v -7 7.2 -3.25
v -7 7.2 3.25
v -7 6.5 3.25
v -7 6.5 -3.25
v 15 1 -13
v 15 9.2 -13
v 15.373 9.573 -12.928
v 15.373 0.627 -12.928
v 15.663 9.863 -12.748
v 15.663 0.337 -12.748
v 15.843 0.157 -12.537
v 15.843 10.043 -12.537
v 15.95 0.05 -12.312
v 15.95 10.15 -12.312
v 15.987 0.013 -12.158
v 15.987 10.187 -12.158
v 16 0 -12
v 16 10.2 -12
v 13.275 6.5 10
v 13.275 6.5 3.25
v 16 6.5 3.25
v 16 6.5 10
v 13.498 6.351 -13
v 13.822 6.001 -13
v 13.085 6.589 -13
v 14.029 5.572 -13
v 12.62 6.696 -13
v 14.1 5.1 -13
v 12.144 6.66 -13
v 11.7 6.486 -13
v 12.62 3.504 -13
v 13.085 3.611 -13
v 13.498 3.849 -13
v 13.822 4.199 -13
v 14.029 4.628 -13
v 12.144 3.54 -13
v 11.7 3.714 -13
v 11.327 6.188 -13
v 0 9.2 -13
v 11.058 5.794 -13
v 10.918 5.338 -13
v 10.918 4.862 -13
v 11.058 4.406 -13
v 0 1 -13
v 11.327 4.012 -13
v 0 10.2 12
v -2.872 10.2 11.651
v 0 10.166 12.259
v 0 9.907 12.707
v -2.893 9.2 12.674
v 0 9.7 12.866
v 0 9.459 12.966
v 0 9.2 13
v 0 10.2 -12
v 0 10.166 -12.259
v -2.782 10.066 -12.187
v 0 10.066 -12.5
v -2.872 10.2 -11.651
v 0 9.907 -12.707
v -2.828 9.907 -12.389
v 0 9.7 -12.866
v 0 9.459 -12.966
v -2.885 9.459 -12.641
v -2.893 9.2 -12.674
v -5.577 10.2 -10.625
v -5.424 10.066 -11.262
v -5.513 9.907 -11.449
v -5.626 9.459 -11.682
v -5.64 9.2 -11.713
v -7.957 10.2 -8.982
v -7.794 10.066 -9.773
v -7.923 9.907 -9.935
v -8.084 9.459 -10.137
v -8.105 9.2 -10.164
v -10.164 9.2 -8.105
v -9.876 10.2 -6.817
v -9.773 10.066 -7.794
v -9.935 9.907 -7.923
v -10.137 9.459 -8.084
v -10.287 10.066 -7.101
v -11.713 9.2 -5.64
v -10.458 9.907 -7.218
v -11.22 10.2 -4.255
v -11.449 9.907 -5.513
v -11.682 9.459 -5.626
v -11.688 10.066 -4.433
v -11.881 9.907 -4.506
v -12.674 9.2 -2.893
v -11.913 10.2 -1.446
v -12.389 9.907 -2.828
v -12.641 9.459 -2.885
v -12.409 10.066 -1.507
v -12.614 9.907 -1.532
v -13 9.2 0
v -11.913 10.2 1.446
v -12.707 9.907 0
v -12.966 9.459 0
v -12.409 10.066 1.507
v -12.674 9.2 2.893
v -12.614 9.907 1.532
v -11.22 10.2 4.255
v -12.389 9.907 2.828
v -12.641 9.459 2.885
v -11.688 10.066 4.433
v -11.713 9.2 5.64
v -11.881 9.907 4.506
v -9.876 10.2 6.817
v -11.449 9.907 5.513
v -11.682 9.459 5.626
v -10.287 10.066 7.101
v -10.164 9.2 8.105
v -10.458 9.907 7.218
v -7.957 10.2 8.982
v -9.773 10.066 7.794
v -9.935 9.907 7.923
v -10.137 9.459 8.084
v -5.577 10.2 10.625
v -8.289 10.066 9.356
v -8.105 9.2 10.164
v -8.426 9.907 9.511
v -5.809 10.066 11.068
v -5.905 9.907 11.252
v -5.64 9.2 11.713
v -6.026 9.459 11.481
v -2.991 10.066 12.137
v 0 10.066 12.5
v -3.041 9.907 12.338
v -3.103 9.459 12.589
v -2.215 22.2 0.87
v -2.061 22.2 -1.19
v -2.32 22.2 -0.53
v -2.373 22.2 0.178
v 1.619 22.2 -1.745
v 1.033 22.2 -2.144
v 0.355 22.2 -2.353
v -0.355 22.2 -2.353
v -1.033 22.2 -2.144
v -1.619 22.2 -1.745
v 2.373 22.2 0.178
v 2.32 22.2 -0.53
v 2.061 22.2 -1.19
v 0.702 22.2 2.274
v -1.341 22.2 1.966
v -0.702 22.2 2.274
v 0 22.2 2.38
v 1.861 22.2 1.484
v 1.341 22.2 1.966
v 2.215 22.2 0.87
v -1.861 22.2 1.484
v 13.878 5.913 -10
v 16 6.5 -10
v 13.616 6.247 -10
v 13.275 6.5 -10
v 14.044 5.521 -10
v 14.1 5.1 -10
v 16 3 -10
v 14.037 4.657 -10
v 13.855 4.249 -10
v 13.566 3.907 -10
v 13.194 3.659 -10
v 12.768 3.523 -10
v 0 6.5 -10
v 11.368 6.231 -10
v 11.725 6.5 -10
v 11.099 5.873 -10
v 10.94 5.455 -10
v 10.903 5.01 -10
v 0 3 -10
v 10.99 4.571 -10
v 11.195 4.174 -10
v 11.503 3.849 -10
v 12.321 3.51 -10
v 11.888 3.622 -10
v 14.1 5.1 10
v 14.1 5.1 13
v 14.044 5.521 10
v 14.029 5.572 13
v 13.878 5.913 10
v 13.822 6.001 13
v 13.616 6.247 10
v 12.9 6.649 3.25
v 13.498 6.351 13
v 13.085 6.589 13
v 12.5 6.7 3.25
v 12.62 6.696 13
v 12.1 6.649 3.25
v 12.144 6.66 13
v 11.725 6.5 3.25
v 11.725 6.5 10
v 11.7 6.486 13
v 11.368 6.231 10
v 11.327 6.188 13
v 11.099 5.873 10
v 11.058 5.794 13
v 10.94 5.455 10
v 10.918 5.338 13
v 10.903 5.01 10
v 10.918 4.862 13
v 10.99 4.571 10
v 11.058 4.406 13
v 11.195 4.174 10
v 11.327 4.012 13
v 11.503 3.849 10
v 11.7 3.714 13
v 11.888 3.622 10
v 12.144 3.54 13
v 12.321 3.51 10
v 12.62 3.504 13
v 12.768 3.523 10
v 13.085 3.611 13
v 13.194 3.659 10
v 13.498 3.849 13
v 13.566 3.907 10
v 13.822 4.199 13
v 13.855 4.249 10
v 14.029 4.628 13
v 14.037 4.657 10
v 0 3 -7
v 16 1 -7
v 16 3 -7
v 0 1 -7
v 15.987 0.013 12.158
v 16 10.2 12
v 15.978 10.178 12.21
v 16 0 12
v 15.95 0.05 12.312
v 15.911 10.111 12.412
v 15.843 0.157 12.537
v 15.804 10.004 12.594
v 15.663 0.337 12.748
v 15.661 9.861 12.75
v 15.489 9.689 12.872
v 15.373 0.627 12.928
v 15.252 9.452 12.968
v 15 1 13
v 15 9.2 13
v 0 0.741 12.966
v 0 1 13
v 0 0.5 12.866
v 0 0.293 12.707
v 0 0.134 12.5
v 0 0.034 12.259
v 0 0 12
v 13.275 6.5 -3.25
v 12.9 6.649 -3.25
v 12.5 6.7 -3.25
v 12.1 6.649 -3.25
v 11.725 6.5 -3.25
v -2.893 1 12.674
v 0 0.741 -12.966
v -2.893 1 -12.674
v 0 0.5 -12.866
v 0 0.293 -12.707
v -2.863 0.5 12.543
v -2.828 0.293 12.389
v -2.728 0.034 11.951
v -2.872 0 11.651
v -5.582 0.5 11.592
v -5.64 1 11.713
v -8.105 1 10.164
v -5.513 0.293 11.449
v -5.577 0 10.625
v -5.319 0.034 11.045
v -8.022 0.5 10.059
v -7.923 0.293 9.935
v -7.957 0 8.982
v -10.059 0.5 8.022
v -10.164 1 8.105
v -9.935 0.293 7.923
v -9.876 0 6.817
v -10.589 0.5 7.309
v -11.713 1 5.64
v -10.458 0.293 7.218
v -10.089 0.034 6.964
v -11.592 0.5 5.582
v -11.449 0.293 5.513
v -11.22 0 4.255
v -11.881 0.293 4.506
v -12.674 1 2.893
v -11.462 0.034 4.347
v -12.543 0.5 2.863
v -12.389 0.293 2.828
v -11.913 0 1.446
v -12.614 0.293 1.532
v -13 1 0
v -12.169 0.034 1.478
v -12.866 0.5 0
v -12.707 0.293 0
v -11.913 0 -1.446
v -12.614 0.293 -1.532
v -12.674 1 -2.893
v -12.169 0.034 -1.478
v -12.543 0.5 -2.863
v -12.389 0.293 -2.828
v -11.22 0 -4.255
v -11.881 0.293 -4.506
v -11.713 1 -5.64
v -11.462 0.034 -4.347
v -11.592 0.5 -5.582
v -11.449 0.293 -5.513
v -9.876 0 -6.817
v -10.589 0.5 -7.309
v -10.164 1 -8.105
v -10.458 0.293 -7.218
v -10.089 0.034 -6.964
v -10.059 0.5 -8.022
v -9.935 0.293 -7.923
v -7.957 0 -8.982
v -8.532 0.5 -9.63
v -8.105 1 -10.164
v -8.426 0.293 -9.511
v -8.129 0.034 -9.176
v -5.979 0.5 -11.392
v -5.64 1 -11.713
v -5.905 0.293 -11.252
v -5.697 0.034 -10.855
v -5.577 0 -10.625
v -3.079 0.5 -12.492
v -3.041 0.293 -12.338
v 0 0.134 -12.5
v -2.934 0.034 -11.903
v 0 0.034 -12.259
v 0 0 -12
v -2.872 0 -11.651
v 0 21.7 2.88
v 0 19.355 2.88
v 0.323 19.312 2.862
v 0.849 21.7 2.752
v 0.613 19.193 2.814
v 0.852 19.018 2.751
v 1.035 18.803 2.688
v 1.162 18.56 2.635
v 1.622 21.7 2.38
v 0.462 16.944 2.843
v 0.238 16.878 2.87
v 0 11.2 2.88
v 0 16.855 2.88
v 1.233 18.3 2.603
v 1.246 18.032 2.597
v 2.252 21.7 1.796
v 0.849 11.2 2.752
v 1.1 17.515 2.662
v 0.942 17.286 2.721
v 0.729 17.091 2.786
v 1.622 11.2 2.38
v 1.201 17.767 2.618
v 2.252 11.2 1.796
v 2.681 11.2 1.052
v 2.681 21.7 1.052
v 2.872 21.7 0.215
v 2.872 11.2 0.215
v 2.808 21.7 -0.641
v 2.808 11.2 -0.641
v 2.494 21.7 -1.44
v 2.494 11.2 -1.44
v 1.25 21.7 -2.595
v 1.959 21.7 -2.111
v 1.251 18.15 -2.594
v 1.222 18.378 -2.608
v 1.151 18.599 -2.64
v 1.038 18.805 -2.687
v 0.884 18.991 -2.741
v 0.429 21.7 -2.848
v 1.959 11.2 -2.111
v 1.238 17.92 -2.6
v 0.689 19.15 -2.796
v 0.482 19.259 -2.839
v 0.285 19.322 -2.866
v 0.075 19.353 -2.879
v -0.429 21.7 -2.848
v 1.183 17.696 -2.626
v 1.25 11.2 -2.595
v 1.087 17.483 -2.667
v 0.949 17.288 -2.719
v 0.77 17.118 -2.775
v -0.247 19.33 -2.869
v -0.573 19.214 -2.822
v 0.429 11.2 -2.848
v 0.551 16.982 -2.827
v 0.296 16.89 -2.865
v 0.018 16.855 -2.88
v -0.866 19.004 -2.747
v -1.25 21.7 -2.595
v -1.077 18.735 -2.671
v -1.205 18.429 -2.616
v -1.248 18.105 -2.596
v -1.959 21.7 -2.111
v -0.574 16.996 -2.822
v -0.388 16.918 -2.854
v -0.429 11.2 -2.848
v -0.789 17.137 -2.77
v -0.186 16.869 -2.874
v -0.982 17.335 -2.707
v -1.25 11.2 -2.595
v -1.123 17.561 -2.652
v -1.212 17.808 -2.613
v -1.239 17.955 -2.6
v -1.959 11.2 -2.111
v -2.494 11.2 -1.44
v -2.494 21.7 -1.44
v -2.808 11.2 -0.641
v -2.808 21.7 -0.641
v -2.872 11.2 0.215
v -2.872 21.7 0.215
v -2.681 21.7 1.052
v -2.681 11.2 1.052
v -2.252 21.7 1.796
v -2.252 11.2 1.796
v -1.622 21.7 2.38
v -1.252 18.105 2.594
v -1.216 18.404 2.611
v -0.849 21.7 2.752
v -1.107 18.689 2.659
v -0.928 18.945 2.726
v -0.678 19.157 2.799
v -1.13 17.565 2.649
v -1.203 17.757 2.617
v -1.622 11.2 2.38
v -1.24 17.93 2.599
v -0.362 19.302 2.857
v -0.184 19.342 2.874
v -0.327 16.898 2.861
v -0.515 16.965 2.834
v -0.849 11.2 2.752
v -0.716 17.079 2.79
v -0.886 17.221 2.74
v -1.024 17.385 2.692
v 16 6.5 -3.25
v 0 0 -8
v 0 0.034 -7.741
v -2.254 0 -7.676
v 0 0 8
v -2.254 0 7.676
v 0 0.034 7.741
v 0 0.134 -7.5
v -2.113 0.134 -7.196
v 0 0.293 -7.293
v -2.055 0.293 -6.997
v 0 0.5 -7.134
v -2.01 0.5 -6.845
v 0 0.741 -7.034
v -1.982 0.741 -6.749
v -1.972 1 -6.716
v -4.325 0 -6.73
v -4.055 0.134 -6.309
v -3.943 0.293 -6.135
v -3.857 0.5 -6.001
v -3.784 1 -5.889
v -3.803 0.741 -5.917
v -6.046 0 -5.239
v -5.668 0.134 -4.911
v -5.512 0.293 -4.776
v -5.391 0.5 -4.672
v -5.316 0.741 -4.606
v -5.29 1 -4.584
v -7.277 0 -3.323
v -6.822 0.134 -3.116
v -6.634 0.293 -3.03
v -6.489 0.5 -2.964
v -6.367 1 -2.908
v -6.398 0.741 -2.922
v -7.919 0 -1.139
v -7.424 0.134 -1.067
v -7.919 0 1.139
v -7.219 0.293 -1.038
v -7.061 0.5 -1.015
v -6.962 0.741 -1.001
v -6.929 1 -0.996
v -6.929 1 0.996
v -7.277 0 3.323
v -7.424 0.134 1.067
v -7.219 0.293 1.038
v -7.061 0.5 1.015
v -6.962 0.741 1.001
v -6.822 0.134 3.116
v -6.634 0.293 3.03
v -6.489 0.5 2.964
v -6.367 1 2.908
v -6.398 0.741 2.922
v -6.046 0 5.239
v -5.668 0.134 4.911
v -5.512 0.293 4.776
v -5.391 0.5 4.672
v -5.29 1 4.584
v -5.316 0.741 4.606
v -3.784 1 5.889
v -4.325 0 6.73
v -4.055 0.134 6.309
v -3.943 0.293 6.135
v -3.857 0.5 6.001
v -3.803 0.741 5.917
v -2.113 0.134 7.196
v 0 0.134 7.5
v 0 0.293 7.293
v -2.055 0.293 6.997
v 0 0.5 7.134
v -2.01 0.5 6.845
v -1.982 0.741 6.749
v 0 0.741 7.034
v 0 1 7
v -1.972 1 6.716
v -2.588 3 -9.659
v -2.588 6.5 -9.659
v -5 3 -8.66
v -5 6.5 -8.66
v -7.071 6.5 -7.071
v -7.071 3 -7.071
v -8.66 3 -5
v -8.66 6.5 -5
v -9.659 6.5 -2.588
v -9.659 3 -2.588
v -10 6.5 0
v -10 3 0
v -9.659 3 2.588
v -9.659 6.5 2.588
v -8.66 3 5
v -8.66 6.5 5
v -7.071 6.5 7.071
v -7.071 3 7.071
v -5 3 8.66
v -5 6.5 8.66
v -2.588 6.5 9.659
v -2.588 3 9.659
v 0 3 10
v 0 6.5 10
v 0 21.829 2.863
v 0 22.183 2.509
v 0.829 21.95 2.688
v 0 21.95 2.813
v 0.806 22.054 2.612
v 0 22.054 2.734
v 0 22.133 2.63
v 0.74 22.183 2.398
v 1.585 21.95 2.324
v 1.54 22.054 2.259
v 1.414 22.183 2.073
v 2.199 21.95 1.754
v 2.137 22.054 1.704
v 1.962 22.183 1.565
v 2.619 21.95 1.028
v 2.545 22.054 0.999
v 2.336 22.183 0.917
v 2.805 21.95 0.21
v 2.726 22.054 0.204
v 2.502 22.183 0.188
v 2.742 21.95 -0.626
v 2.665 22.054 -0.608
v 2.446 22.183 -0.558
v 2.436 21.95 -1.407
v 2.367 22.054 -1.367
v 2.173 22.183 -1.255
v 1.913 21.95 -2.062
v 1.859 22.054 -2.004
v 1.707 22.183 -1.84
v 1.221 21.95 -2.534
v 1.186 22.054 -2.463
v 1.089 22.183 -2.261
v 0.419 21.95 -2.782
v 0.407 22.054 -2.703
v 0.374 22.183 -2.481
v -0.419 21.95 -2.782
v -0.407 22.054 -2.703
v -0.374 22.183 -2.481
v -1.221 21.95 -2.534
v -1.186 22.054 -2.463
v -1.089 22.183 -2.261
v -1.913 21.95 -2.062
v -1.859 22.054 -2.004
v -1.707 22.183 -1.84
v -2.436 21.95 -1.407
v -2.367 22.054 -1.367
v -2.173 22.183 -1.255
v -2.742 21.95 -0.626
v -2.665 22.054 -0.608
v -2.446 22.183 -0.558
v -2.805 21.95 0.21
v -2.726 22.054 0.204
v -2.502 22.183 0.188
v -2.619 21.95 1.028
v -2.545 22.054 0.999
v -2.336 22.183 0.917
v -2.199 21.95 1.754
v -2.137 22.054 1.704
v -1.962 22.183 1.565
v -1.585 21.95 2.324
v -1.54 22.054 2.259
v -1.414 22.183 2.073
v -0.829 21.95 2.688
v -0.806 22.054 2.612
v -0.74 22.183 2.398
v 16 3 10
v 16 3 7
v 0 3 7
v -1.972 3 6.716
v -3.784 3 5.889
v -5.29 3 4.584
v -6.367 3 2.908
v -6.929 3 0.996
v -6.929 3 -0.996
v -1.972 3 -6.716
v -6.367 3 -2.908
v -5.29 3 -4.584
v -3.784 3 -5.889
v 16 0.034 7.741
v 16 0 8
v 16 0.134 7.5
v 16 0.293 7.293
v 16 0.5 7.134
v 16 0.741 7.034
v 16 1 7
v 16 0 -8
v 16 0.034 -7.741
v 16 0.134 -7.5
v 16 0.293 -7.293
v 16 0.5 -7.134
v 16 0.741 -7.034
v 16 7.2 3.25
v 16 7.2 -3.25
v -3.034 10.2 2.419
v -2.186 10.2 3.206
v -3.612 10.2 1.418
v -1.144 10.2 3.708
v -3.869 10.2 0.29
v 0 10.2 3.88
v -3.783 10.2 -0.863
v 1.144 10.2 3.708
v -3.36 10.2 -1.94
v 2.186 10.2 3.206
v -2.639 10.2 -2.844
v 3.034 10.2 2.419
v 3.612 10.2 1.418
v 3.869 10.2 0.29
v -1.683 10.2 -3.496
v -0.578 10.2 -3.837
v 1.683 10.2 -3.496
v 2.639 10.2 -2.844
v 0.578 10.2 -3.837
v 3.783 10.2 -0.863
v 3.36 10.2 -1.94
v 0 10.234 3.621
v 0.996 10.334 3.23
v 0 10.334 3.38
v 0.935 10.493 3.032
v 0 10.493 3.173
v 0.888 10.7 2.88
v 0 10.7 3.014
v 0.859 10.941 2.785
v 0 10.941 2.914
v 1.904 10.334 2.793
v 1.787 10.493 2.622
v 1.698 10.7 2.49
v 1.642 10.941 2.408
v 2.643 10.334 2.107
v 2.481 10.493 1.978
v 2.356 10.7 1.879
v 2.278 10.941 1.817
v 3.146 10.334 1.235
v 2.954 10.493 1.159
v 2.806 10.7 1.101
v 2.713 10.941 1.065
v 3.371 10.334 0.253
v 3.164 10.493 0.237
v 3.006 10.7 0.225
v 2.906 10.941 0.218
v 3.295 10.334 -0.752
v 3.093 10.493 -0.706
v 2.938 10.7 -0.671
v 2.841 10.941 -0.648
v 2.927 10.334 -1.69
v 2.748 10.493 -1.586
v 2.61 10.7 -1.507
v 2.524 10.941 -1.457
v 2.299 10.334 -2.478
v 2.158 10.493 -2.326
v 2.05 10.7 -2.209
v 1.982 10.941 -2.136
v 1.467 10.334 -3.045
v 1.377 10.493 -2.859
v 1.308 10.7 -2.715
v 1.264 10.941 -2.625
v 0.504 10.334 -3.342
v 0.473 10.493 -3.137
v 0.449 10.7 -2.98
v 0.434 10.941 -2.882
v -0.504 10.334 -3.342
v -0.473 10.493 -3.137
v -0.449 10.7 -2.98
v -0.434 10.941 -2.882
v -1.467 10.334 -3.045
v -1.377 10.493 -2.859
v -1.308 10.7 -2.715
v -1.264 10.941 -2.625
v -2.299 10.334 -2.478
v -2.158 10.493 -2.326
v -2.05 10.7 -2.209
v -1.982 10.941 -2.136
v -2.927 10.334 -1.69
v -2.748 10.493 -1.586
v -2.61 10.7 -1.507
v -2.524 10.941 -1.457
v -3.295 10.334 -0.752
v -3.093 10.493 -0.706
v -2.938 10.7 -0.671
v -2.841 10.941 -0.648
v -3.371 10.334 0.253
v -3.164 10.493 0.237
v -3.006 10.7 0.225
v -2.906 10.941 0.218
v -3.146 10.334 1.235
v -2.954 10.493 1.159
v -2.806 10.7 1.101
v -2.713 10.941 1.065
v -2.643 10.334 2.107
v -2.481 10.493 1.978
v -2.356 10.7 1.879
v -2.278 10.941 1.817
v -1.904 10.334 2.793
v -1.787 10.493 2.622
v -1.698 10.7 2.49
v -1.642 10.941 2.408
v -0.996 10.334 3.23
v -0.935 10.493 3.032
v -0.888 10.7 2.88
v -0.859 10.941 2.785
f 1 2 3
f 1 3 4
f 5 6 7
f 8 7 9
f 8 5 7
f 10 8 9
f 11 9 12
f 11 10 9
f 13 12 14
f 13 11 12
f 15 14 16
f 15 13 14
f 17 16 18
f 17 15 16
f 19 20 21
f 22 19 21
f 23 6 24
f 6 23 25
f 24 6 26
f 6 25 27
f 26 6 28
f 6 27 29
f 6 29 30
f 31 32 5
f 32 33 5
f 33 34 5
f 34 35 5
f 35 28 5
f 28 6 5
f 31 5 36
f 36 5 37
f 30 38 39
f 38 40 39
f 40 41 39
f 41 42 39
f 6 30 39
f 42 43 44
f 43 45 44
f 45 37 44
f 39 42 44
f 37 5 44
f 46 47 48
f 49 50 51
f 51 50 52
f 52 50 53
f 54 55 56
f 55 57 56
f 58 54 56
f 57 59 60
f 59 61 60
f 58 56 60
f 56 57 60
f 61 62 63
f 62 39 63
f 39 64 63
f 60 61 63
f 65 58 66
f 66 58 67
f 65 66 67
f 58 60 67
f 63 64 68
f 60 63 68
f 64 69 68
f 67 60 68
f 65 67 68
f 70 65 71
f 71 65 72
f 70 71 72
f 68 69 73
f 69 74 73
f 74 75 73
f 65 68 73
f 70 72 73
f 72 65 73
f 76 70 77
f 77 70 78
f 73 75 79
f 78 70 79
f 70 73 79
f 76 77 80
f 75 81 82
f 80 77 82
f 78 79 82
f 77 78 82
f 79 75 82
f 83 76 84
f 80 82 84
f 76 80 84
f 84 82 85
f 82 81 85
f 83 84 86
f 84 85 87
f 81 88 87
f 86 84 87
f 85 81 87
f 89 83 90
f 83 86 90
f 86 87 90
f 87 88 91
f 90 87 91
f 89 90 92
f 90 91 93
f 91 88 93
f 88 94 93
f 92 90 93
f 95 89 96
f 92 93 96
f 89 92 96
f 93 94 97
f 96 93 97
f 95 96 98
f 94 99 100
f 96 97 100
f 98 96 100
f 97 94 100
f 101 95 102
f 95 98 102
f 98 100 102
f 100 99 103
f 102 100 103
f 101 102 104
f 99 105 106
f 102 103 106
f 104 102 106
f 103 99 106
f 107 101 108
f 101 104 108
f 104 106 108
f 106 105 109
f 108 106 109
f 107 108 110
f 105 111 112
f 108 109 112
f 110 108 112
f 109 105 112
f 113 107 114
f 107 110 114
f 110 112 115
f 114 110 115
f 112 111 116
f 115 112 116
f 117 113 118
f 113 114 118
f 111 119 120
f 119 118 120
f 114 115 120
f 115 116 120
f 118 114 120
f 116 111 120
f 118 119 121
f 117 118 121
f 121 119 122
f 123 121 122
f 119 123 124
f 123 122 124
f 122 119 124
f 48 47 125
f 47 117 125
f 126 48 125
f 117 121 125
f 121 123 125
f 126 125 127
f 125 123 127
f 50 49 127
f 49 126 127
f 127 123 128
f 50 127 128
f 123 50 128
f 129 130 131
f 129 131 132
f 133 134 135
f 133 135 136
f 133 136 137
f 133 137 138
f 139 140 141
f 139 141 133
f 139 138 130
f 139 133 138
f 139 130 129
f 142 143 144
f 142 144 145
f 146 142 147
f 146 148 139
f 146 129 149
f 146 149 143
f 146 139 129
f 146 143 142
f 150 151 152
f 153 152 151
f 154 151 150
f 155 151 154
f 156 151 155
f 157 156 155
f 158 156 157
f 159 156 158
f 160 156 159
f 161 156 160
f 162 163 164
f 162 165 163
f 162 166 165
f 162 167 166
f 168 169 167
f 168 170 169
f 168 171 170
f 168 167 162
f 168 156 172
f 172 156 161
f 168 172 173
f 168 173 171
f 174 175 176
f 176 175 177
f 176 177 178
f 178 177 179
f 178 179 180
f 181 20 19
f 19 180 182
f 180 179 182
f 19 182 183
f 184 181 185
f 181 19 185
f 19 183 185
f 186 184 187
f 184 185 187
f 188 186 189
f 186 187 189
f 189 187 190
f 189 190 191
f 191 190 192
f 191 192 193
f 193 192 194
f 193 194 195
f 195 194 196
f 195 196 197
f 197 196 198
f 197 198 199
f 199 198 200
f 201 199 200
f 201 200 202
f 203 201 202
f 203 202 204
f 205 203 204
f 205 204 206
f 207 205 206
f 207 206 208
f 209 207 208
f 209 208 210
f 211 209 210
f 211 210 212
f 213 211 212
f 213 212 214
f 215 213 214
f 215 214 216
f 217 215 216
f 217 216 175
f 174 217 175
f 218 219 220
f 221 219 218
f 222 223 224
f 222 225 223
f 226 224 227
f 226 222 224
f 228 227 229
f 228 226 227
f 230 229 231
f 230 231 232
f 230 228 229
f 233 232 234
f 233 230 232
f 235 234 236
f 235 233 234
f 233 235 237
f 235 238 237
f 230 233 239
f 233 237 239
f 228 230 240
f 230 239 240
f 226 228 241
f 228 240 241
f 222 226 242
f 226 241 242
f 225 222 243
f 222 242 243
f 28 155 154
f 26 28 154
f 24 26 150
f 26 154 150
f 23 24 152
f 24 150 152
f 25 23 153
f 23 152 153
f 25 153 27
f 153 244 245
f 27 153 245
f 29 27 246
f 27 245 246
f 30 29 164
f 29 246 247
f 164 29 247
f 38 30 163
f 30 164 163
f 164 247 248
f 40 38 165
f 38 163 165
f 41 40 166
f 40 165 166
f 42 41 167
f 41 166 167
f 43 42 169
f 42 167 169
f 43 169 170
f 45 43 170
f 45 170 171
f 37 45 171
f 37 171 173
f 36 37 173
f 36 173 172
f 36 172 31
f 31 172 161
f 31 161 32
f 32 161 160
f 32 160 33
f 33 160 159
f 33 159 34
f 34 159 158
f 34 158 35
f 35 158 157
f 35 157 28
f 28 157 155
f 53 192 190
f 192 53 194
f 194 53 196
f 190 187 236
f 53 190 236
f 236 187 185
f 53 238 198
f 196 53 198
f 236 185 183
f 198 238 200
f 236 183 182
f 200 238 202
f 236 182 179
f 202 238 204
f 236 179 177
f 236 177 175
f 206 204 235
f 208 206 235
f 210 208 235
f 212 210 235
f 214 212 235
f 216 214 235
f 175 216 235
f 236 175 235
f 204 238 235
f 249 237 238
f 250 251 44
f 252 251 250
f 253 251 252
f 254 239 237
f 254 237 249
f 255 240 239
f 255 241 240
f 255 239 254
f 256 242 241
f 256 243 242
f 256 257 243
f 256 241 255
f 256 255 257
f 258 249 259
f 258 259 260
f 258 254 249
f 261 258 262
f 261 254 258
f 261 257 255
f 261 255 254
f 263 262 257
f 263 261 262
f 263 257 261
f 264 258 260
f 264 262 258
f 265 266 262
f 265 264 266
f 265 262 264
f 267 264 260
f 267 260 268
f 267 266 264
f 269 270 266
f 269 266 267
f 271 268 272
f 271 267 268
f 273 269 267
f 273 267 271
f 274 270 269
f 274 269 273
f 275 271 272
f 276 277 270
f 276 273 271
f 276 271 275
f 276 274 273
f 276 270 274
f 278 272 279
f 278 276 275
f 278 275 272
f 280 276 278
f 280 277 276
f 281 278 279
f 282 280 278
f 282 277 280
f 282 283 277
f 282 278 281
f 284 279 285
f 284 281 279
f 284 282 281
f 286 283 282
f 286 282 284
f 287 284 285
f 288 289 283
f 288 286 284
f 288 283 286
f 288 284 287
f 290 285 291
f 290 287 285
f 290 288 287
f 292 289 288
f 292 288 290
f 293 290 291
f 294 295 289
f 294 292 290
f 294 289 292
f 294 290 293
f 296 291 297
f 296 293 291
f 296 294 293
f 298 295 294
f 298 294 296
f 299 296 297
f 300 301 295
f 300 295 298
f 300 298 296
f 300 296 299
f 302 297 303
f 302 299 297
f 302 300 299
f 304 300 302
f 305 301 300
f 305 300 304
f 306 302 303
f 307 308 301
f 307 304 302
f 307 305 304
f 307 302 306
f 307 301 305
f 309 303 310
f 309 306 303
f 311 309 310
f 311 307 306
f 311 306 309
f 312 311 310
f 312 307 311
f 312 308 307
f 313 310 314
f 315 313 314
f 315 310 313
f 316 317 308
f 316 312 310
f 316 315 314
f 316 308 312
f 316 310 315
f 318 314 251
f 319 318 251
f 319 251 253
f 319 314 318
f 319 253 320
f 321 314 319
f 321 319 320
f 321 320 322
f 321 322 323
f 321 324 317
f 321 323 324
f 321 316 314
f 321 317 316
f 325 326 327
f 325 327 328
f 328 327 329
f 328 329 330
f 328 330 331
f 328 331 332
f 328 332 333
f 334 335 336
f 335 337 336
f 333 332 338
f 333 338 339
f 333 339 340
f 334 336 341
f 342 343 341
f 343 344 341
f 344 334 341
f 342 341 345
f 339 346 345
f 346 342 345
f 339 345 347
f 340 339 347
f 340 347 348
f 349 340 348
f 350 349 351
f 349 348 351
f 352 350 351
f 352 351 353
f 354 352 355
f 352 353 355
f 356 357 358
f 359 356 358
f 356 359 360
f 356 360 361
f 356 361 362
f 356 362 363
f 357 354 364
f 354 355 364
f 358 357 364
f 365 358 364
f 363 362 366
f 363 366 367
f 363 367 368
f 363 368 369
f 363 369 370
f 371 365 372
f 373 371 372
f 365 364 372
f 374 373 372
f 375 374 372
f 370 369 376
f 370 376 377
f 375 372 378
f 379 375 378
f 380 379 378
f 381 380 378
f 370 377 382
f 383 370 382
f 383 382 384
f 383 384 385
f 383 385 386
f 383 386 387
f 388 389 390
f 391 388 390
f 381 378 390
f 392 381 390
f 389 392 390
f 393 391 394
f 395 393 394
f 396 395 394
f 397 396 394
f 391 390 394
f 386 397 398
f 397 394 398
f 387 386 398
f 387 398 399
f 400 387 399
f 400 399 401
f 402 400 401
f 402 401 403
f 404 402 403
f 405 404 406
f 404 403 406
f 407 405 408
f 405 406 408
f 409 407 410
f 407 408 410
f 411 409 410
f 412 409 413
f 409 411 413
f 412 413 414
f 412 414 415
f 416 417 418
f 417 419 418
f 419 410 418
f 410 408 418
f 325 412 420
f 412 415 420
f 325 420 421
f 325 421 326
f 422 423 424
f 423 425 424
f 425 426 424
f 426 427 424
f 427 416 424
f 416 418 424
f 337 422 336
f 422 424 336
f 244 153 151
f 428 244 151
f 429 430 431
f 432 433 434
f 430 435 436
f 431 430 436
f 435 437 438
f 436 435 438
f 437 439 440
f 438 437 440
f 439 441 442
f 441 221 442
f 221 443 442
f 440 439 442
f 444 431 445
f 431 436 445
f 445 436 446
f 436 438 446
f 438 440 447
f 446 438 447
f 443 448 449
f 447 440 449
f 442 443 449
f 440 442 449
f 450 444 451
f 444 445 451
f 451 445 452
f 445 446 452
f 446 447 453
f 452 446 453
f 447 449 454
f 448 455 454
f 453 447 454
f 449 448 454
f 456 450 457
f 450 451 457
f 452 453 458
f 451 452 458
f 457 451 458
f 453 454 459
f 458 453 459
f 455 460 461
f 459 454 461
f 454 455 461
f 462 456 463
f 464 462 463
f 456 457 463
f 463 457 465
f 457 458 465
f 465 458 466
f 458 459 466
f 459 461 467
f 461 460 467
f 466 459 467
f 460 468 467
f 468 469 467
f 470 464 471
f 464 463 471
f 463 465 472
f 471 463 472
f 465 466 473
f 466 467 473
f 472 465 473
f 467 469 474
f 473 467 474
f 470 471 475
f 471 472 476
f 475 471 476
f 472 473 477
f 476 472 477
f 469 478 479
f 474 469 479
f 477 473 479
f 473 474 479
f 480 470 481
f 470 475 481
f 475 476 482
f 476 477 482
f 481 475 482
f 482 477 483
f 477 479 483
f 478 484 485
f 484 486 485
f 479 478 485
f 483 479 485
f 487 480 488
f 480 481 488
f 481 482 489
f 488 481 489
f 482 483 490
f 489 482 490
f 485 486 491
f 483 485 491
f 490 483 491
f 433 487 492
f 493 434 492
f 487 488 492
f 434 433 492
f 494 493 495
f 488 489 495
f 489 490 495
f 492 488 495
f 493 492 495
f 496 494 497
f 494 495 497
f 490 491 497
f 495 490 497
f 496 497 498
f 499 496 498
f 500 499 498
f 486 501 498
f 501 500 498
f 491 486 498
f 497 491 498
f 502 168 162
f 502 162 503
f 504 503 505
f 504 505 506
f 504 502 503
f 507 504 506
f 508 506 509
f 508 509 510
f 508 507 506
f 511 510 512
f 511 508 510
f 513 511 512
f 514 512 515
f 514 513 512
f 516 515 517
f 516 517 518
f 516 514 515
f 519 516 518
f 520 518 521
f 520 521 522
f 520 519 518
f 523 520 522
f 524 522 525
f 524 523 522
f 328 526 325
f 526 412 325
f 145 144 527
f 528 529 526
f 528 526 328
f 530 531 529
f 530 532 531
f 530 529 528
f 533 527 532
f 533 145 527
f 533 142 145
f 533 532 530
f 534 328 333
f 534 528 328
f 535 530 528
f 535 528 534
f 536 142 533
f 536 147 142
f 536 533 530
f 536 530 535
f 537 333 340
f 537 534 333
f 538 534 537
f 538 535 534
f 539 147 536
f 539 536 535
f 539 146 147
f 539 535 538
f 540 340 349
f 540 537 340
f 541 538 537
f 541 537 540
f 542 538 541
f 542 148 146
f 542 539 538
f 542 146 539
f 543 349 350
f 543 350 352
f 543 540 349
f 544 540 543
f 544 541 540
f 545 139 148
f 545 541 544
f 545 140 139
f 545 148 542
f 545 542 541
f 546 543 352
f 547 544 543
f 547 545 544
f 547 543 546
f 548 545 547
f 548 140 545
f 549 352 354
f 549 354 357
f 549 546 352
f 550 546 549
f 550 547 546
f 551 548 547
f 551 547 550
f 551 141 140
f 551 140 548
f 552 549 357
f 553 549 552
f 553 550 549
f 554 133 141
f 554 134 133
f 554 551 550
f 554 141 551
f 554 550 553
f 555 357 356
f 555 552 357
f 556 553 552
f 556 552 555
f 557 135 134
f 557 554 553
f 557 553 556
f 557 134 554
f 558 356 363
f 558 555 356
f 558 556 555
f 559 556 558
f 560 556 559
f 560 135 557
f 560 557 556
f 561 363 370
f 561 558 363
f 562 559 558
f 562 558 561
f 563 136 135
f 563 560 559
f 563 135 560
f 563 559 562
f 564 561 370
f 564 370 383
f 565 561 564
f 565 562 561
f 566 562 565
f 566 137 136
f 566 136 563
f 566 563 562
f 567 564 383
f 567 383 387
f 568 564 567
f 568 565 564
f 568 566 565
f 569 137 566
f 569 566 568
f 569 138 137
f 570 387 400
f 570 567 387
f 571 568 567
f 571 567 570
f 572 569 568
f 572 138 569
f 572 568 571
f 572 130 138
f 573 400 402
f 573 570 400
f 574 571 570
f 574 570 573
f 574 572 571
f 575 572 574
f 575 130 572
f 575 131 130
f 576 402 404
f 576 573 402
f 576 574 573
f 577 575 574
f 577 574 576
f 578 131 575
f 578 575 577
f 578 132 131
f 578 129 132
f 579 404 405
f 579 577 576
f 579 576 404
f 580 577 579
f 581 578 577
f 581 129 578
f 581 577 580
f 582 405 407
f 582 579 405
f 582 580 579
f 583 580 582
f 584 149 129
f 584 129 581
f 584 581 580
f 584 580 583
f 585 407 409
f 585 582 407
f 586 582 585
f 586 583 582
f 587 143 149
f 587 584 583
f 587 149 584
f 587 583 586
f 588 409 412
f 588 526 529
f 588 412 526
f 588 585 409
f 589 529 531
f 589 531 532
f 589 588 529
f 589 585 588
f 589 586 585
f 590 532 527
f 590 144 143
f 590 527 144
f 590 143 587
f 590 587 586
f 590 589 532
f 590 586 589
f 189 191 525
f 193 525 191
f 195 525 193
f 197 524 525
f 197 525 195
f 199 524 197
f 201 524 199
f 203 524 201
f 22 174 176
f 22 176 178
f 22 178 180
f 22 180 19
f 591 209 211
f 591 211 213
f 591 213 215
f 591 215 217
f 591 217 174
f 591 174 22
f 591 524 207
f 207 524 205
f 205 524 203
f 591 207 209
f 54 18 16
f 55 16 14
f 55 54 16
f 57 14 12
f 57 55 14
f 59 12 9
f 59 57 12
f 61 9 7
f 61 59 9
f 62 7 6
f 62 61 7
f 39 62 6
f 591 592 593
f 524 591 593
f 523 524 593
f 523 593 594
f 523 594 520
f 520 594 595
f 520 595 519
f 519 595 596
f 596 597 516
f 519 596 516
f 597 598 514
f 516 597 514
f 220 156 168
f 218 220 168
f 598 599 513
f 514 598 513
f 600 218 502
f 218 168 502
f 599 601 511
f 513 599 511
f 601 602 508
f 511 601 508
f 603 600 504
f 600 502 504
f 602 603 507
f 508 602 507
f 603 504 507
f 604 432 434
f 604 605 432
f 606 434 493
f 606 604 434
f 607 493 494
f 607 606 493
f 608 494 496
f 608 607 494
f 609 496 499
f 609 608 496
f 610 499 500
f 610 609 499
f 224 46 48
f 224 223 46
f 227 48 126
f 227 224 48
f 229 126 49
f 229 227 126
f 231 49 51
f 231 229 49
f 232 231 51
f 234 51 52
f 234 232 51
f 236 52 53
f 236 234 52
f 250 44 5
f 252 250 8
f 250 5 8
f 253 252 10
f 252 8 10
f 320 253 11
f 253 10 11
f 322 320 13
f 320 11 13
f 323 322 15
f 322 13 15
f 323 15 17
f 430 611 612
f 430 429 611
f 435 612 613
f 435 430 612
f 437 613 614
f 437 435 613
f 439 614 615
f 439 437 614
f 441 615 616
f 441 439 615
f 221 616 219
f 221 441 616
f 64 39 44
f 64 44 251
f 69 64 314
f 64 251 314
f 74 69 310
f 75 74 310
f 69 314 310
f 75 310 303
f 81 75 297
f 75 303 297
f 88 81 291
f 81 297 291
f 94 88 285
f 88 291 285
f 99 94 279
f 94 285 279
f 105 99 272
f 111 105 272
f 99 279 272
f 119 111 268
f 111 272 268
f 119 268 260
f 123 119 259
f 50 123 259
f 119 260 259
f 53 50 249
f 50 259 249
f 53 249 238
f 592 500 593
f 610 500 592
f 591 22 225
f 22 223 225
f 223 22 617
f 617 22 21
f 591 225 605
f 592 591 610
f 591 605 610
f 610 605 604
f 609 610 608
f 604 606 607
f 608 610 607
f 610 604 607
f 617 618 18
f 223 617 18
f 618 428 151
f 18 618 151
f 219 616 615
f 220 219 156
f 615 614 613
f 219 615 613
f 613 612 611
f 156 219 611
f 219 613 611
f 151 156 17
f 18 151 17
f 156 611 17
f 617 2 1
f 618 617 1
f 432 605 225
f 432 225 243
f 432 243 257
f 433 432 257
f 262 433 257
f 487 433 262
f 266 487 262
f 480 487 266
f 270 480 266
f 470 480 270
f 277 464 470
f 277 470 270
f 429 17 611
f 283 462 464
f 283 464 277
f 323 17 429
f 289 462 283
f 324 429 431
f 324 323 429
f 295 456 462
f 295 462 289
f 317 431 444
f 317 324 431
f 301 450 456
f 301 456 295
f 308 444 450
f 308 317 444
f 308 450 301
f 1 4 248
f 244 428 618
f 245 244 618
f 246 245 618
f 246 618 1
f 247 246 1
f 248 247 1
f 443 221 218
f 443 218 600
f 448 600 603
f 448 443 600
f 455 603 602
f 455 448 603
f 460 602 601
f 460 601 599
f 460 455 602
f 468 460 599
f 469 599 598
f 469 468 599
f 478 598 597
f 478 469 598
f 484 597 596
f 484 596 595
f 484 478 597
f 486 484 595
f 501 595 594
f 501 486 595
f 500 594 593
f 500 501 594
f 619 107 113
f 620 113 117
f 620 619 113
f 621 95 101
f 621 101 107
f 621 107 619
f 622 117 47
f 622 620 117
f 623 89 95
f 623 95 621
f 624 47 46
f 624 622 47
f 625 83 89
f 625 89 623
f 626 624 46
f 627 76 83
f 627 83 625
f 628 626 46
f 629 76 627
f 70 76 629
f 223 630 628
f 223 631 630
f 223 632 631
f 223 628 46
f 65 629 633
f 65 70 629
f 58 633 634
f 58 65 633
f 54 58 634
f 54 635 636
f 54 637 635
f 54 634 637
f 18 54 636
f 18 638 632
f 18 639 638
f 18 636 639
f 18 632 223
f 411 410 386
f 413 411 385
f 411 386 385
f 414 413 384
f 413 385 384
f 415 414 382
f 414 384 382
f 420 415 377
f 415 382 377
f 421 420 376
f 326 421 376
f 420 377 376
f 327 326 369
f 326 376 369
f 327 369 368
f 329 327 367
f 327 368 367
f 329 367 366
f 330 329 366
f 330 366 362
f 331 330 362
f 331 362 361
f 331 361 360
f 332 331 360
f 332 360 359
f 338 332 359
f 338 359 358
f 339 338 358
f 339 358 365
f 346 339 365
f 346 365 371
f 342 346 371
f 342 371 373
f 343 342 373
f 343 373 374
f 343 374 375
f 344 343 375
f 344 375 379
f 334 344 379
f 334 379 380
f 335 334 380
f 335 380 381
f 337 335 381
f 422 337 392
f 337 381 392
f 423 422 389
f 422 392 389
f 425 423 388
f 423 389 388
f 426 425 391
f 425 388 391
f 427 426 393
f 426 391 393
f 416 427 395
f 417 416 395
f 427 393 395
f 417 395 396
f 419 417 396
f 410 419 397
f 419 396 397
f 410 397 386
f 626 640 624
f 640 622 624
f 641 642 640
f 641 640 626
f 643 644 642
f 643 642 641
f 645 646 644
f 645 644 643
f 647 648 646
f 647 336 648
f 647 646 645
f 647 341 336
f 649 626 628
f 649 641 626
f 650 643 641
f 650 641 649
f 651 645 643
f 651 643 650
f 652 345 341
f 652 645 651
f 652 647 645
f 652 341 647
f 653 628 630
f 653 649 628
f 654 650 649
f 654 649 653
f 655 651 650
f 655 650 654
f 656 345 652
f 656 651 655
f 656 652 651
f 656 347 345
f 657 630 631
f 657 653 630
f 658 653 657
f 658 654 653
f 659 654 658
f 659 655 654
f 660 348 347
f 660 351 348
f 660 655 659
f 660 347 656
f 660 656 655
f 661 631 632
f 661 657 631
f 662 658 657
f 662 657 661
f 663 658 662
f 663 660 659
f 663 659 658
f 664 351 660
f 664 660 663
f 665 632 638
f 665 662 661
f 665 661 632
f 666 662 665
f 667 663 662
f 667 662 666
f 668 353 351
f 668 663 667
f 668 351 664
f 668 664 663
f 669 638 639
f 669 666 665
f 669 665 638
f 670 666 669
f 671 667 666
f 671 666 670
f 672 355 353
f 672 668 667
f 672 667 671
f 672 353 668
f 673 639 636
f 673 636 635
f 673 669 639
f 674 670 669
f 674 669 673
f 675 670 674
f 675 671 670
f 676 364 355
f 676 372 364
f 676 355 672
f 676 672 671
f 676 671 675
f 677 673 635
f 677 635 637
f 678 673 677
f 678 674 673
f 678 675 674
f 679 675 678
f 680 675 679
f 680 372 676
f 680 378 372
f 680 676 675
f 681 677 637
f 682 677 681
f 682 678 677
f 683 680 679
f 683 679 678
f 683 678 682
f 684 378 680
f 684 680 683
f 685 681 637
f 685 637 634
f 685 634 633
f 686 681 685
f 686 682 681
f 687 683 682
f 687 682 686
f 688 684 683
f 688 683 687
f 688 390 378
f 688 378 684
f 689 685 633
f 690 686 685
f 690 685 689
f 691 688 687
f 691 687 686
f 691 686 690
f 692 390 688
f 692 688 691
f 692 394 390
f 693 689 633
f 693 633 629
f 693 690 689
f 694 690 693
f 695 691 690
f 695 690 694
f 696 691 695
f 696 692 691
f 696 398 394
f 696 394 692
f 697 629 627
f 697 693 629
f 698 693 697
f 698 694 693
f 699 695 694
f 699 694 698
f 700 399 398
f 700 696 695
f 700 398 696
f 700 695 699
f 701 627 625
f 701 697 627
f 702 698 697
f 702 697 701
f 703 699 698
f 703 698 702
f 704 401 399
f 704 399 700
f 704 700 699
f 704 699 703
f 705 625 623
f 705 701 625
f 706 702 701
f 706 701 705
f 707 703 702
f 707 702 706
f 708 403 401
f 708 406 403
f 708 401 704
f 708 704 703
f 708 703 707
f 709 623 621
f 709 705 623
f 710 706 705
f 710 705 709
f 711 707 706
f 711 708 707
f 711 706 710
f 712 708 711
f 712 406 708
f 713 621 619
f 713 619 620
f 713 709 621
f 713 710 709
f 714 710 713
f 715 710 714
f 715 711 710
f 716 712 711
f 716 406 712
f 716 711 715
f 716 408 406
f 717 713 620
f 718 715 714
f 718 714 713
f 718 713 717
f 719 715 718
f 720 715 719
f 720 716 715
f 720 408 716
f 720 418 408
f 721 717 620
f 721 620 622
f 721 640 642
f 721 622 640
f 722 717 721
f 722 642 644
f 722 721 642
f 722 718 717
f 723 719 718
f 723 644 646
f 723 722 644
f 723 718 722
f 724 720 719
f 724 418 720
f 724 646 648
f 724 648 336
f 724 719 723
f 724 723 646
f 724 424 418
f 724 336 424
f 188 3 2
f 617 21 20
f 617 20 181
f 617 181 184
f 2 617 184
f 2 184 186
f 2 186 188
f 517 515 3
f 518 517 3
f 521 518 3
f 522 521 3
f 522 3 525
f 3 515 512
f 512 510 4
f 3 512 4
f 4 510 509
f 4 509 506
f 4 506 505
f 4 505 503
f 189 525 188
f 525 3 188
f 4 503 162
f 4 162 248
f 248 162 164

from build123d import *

# Parameters (mm, degrees)
BOSS_EXTRUDE1_DEPTH   = 3
BOSS_EXTRUDE2_DEPTH   = 3.5
BOSS_EXTRUDE3_DEPTH   = 3.7
SKETCH4_R             = 2.88
BOSS_EXTRUDE4_DEPTH   = 12
SKETCH9_W             = 6.5
SKETCH9_H             = 0.7
CUT_EXTRUDE2_DEPTH    = 23
F_2_5MM_DOWEL_HOLE1_D = 2.5
SKETCH8_R             = 1.6
CUT_EXTRUDE1_DEPTH    = 38.747052924
FILLET1_R             = 1
FILLET2_R             = 1
FILLET3_R             = 0.5


with BuildPart() as part:
    # Sketch1 → Boss-Extrude1 (new body)
    with BuildSketch(Plane(origin=(0, 0, 0), x_dir=(1, 0, 0), z_dir=(0, 1, 0))):
        with BuildLine():
            Line((0, 13), (16, 13))
            Line((16, 13), (16, 7))
            Line((16, 7), (0, 7))
            ThreePointArc((0, 7), (-7, 0), (0, -7))
            Line((0, -7), (16, -7))
            Line((16, -7), (16, -13))
            Line((16, -13), (0, -13))
            ThreePointArc((0, -13), (-13, 0), (0, 13))
        make_face()
    extrude(amount=BOSS_EXTRUDE1_DEPTH)

    # Sketch2 → Boss-Extrude2 (add)
    with BuildSketch(Plane(origin=(0, 3, 0), x_dir=(1, 0, 0), z_dir=(0, 1, 0))):
        with BuildLine():
            Line((0, 13), (16, 13))
            Line((16, 13), (16, 10))
            Line((16, 10), (0, 10))
            ThreePointArc((0, 10), (-10, 0), (0, -10))
            Line((0, -10), (16, -10))
            Line((16, -10), (16, -13))
            Line((16, -13), (0, -13))
            ThreePointArc((0, -13), (-13, 0), (0, 13))
        make_face()
    extrude(amount=BOSS_EXTRUDE2_DEPTH)

    # Sketch3 → Boss-Extrude3 (add)
    with BuildSketch(Plane(origin=(0, 6.5, 0), x_dir=(1, 0, 0), z_dir=(0, 1, 0))):
        with BuildLine():
            Line((16, 13), (0, 13))
            ThreePointArc((0, 13), (-13, 0), (0, -13))
            Line((0, -13), (16, -13))
            Line((16, -13), (16, -7))
            Line((16, -7), (16, 7))
            Line((16, 7), (16, 13))
        make_face()
    extrude(amount=BOSS_EXTRUDE3_DEPTH)

    # Sketch4 → Boss-Extrude4 (add)
    with BuildSketch(Plane(origin=(0, 10.2, 0), x_dir=(1, 0, 0), z_dir=(0, 1, 0))):
        with Locations(Location((0, 0, 0), (0, 0, 270))):
            Circle(SKETCH4_R)
    extrude(amount=BOSS_EXTRUDE4_DEPTH)

    # Sketch9 → Cut-Extrude2 (cut)
    with BuildSketch(Plane(origin=(16, 0, 0), x_dir=(0, 0, -1), z_dir=(1, 0, 0))):
        with Locations((0, 6.85)):
            Rectangle(SKETCH9_W, SKETCH9_H)
    extrude(amount=-CUT_EXTRUDE2_DEPTH, mode=Mode.SUBTRACT)

    # Ø2.5mm Dowel Hole1 (through all)
    with Locations(Plane(origin=(-0.002429038, 18.104937254, 2.879998976), x_dir=(0.999999644325, 0, 0.000843415861), z_dir=(-0.000843415861, 0, 0.999999644325))):
        with Locations((0, 0)):
            Hole(F_2_5MM_DOWEL_HOLE1_D / 2)

    # Sketch8 → Cut-Extrude1 (cut, through all)
    with BuildSketch(Plane.XY.offset(13)):
        with Locations((12.5, 5.1)):
            Circle(SKETCH8_R)
    extrude(amount=-CUT_EXTRUDE1_DEPTH, mode=Mode.SUBTRACT)

    # Fillet1
    fillet1_edges = [part.edges().sort_by_distance(p)[0] for p in [
        (8, 0, -13),
        (8, 0, -7),
        (-7, 0, 0),
        (16, 5.1, 13),
        (16, 5.1, -13),
        (-13, 10.2, 0),
        (8, 10.2, 13),
        (8, 10.2, -13),
        (8, 0, 7),
        (8, 0, 13),
        (-13, 0, 0),
    ]]
    fillet(fillet1_edges, radius=FILLET1_R)

    # Fillet2
    fillet2_edges = [part.edges().sort_by_distance(p)[0] for p in [
        (0, 10.2, -2.88),
    ]]
    fillet(fillet2_edges, radius=FILLET2_R)

    # Fillet3
    fillet3_edges = [part.edges().sort_by_distance(p)[0] for p in [
        (0, 22.2, -2.88),
    ]]
    fillet(fillet3_edges, radius=FILLET3_R)


solid = part.part
